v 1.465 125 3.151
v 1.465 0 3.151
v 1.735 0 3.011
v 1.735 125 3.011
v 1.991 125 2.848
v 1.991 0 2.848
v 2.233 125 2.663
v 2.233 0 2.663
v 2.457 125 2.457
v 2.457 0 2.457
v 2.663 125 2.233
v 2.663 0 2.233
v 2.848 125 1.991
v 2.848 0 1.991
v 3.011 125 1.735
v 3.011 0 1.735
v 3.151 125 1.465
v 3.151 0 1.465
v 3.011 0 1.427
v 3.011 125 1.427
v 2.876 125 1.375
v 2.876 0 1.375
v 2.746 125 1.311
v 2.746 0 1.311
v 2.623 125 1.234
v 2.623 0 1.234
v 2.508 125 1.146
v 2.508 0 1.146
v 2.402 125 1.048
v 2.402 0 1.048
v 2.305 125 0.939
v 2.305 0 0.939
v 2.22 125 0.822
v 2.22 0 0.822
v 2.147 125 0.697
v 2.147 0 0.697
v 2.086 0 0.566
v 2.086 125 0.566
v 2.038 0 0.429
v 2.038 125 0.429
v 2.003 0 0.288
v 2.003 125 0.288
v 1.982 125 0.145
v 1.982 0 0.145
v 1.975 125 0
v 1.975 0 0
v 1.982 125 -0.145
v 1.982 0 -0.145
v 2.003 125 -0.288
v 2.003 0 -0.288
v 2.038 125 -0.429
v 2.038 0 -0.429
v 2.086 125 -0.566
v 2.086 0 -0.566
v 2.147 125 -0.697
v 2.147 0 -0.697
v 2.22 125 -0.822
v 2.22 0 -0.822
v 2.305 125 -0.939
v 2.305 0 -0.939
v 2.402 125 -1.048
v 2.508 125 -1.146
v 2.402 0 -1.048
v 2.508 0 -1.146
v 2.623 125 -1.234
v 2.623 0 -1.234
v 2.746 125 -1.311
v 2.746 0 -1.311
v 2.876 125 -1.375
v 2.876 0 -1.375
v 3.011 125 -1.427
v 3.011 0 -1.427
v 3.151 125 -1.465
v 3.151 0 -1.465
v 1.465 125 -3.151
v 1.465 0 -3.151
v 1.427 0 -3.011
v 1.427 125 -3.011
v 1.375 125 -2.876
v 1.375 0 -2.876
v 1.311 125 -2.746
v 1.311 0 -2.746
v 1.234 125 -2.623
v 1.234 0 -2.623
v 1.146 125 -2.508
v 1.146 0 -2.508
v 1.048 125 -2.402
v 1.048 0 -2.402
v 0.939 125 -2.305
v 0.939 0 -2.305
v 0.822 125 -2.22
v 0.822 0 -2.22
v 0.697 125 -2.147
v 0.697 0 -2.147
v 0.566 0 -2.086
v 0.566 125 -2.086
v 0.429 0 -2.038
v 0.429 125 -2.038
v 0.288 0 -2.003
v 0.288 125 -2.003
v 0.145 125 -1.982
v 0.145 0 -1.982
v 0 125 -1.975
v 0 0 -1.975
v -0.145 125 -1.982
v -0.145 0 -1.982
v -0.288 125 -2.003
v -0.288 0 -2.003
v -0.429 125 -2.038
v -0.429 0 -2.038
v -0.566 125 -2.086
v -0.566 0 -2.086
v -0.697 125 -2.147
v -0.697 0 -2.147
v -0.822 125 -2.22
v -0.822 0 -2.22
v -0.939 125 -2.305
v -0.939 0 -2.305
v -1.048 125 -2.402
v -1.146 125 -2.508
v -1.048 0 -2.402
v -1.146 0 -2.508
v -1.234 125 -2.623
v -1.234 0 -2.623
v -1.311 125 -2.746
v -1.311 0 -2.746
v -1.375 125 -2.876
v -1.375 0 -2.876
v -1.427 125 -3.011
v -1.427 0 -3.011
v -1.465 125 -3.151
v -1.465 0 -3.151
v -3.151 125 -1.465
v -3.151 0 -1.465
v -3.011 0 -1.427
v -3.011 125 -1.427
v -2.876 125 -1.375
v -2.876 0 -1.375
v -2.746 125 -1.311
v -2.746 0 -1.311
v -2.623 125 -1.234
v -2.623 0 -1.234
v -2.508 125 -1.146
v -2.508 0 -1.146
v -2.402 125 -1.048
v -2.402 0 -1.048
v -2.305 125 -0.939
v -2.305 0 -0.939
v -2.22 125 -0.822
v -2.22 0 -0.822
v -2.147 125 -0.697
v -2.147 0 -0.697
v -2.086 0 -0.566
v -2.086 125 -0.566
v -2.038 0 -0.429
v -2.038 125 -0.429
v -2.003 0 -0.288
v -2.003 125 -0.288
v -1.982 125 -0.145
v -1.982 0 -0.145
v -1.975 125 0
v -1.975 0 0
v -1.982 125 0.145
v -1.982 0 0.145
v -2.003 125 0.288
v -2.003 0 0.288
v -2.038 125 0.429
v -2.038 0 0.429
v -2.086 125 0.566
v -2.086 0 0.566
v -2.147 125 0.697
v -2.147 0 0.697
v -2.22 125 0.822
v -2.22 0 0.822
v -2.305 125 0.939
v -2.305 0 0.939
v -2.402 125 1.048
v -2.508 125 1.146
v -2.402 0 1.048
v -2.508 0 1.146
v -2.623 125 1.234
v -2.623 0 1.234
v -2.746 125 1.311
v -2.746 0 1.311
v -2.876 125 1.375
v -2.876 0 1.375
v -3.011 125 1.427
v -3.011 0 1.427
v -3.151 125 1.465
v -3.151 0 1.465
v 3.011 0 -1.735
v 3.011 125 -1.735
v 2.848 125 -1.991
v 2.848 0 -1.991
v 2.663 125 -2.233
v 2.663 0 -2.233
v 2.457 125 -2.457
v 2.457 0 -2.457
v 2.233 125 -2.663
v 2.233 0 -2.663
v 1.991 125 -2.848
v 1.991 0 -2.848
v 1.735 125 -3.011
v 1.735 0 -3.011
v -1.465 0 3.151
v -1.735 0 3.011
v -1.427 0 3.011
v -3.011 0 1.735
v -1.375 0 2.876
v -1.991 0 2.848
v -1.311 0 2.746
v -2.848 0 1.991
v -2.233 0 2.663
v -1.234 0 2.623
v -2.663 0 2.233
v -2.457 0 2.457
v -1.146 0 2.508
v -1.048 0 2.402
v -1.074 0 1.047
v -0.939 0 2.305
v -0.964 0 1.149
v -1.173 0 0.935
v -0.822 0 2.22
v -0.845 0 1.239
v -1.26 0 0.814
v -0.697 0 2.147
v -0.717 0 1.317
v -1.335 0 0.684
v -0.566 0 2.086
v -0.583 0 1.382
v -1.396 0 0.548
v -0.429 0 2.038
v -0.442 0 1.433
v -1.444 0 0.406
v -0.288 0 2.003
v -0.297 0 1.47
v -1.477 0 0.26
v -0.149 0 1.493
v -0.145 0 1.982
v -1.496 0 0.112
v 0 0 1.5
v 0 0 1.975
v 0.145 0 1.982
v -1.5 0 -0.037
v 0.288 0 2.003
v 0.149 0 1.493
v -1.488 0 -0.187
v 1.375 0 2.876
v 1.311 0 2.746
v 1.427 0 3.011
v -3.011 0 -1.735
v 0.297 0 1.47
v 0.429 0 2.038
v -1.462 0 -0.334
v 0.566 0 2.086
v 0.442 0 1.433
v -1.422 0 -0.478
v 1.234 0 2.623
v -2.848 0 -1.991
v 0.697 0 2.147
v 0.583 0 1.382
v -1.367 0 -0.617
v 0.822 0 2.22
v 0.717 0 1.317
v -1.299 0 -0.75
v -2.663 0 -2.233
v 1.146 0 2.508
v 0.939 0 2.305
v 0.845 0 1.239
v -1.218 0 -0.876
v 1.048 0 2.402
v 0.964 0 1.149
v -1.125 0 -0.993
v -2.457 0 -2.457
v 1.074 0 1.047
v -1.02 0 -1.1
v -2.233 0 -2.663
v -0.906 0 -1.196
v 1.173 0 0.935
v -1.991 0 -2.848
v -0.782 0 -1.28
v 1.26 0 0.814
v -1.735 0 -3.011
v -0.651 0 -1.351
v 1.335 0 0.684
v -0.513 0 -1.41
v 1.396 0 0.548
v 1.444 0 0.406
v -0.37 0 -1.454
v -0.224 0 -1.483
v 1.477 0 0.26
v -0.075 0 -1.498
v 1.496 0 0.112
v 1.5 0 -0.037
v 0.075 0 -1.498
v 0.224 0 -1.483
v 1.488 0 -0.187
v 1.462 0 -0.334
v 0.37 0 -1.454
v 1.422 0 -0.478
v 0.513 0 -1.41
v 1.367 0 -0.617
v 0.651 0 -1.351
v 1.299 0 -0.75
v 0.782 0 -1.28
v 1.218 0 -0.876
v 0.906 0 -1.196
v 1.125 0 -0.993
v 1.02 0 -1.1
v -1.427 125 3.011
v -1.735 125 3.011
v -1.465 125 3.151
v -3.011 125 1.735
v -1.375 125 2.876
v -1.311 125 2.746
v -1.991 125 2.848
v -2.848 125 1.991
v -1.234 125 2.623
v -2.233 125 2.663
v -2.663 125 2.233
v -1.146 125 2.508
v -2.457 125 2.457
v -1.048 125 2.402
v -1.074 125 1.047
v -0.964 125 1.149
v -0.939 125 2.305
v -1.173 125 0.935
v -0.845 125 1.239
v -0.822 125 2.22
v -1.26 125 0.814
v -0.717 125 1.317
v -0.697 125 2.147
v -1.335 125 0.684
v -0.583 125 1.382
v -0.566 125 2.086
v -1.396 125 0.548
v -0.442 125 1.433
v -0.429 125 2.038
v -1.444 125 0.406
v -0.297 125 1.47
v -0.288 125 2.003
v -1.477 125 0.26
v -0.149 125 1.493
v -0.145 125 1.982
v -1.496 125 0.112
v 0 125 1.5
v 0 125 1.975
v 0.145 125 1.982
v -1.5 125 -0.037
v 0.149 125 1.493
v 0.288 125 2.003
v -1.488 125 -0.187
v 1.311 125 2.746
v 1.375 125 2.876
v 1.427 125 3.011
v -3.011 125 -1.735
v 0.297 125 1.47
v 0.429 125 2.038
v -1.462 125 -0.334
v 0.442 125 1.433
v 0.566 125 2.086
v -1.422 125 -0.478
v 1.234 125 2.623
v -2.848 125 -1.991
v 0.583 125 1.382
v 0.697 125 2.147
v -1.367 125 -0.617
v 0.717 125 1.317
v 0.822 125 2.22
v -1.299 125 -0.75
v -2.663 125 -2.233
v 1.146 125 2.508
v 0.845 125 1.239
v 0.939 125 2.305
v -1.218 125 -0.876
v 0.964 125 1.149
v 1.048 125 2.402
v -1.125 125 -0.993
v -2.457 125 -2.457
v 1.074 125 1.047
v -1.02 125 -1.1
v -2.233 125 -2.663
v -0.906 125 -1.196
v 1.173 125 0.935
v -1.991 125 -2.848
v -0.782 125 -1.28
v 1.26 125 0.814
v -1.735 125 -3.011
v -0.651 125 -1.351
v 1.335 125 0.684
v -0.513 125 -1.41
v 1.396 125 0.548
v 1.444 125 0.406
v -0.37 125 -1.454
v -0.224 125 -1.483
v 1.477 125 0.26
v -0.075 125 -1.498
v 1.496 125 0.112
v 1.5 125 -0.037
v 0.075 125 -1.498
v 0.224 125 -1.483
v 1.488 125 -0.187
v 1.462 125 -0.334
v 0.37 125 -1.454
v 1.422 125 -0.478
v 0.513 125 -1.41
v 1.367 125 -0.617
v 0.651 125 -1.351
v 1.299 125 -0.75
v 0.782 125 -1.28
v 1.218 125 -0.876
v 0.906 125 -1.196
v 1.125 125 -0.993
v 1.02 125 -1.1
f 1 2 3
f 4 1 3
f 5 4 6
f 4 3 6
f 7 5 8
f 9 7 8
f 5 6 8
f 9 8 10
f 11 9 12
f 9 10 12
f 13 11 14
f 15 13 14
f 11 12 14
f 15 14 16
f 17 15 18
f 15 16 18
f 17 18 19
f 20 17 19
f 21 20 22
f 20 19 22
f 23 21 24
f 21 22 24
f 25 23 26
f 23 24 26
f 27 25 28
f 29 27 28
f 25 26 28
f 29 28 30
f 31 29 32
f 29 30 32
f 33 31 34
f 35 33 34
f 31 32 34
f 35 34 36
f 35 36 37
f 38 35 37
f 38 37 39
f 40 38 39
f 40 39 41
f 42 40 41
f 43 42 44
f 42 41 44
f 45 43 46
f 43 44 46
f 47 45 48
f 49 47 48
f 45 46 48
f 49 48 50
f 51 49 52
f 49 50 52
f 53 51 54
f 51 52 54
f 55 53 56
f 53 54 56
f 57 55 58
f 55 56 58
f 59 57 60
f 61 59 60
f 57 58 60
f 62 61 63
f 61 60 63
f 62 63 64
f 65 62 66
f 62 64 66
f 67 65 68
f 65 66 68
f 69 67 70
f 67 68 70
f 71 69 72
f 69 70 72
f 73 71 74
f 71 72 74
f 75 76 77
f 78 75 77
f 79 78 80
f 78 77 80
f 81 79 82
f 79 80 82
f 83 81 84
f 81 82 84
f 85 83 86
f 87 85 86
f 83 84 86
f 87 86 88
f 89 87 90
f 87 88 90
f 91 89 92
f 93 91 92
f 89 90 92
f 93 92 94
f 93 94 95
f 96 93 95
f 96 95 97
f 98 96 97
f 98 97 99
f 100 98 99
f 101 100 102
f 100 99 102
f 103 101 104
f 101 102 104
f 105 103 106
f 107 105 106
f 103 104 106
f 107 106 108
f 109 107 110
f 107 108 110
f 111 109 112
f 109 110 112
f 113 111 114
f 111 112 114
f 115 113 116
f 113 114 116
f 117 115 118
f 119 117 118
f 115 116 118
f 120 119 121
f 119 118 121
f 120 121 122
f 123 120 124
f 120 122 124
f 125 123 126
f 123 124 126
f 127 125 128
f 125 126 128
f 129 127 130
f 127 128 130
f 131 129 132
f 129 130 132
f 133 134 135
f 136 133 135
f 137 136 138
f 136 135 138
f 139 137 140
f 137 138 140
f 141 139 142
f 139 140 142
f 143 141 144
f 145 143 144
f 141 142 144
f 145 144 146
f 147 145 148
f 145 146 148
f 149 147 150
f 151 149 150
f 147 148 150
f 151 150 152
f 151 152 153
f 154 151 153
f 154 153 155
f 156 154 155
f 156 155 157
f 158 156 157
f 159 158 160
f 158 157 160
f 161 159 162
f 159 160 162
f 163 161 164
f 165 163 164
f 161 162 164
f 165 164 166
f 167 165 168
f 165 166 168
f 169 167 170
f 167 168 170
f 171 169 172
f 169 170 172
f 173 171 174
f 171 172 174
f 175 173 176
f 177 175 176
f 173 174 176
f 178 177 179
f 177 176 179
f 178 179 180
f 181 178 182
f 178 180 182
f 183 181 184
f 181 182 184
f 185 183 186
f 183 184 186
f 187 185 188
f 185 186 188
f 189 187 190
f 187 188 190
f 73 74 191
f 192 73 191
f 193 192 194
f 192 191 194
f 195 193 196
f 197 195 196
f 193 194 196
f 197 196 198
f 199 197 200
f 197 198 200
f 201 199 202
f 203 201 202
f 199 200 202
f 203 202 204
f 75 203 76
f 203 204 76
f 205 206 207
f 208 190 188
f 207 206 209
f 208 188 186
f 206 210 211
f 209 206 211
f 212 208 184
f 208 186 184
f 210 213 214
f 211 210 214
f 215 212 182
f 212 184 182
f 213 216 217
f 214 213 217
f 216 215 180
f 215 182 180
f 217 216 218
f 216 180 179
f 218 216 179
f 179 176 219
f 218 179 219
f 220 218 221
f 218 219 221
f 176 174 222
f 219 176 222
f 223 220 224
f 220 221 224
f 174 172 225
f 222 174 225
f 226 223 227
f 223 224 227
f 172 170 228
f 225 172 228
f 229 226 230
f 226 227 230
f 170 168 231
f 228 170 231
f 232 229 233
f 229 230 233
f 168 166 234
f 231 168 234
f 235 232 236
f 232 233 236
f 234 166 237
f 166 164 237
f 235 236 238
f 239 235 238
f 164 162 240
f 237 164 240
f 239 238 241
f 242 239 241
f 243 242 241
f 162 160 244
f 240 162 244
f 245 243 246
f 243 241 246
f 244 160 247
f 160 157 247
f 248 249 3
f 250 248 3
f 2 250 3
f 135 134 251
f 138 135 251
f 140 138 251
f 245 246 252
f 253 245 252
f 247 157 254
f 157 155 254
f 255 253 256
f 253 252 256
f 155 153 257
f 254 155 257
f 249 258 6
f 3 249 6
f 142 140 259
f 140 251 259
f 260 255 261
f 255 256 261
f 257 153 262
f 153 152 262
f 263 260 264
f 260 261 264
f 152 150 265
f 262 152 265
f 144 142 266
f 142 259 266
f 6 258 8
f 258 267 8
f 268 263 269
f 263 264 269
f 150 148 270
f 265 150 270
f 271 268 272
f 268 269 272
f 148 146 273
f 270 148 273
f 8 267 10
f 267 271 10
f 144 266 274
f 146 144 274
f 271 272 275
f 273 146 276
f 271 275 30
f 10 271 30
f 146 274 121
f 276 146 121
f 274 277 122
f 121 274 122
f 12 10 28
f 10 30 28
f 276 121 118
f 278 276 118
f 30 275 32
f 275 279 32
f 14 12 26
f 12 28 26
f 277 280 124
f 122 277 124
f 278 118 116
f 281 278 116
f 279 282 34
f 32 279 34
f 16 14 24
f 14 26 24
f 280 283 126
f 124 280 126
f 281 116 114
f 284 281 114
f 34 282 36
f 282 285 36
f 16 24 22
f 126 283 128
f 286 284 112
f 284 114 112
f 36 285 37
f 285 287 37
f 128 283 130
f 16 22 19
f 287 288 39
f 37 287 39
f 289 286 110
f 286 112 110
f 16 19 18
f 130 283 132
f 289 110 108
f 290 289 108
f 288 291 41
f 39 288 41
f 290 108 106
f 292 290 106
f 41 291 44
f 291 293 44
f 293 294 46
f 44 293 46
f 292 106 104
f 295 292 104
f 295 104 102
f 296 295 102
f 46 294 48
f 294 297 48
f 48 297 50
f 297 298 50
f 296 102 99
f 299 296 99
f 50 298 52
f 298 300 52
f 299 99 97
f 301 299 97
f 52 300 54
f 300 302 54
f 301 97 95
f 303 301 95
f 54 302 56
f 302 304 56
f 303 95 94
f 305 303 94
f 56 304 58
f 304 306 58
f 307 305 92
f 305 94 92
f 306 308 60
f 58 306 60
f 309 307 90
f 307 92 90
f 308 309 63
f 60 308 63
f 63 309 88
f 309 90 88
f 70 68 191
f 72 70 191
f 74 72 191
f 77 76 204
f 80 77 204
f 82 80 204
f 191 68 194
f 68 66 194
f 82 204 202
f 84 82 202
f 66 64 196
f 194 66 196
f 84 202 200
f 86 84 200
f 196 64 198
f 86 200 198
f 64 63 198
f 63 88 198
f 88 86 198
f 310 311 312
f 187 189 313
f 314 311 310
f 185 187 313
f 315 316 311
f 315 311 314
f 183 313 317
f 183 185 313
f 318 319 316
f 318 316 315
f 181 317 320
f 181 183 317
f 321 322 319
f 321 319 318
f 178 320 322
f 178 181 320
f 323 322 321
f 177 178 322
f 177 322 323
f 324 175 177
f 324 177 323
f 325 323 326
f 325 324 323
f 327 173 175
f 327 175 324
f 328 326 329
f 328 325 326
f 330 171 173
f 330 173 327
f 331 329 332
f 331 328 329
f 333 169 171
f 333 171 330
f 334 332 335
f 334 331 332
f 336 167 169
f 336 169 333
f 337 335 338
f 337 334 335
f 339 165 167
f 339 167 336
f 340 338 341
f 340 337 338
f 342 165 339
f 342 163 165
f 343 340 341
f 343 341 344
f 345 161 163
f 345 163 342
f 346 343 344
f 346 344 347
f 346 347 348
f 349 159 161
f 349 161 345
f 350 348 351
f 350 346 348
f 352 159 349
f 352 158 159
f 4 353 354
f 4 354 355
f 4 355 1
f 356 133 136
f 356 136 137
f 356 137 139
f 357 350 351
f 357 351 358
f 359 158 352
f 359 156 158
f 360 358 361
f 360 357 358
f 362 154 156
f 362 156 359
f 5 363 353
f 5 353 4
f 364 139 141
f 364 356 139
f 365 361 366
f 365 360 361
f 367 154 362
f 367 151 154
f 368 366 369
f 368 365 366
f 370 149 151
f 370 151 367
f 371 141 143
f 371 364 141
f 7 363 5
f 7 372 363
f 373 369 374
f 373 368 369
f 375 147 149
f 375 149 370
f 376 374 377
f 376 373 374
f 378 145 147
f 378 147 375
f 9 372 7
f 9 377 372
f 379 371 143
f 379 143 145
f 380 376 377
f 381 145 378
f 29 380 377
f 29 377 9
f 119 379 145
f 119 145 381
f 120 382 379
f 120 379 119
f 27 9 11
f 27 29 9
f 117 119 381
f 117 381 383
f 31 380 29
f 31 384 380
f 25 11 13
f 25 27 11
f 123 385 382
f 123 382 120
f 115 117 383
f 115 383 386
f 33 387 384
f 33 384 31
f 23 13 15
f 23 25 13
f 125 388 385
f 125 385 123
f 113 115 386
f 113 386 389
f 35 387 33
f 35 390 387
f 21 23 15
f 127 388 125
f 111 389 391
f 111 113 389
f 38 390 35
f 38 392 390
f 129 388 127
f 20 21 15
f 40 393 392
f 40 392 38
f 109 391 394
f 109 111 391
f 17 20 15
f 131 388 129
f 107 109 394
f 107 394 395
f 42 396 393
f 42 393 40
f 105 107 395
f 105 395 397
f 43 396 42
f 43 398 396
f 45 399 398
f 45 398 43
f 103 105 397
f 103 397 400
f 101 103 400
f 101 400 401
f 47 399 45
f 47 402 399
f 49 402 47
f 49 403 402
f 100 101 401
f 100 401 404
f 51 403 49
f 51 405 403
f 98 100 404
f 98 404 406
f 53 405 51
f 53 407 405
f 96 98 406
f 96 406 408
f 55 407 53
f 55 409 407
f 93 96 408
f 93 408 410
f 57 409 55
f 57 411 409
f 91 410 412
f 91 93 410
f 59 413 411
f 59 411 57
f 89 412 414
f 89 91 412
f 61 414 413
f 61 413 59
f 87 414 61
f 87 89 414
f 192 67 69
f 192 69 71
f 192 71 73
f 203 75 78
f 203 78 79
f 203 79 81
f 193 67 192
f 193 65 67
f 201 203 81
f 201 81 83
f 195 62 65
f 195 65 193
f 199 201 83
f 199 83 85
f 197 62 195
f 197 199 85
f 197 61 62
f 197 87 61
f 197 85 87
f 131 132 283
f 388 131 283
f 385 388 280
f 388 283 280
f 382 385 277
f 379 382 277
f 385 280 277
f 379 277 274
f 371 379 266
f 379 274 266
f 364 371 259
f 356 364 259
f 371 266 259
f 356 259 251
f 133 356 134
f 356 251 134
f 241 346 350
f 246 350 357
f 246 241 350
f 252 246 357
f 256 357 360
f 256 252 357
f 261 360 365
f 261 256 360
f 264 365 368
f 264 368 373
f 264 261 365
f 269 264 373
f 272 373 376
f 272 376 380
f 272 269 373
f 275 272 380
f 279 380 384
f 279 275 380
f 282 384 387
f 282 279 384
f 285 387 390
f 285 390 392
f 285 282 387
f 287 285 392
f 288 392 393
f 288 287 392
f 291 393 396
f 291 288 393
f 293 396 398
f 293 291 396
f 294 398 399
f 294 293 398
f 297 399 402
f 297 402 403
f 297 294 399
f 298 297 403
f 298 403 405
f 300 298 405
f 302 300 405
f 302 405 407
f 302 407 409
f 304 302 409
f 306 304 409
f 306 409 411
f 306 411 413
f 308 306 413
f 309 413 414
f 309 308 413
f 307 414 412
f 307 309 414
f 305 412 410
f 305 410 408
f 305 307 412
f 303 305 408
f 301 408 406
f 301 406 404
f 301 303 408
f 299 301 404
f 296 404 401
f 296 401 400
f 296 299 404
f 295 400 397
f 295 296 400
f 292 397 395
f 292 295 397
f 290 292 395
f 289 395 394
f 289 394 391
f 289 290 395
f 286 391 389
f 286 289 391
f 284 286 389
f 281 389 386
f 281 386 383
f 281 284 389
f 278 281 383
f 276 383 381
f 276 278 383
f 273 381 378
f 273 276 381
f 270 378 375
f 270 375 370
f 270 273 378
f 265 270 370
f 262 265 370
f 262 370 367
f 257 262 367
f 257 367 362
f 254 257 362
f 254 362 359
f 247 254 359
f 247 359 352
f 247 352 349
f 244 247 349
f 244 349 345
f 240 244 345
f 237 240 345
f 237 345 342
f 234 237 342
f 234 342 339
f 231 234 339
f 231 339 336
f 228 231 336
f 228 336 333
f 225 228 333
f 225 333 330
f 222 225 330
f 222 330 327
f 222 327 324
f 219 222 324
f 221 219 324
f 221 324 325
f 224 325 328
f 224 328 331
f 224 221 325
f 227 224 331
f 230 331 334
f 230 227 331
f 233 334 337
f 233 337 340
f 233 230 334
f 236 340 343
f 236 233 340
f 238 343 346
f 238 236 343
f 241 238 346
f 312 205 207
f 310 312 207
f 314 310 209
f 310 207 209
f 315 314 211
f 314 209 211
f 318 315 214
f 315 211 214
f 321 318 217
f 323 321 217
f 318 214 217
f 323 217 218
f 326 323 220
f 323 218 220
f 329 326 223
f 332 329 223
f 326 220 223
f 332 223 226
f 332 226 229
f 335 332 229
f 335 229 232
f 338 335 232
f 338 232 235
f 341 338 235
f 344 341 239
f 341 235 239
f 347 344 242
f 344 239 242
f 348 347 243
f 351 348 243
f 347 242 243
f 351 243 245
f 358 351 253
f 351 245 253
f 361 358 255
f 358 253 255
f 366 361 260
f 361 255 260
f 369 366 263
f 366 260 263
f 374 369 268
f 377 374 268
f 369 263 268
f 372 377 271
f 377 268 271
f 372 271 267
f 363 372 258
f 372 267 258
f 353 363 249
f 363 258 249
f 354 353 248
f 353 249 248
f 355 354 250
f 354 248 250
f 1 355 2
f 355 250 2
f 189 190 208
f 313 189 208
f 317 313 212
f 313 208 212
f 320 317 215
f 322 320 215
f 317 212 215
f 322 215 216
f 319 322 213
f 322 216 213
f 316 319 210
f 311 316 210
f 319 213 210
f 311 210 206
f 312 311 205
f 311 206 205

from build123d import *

# Parameters (mm, degrees)
SKETCH1_R           = 1.5
BOSS_EXTRUDE1_DEPTH = 125


with BuildPart() as part:
    # Sketch1 → Boss-Extrude1 (new body)
    with BuildSketch(Plane(origin=(0, 0, 0), x_dir=(1, 0, 0), z_dir=(0, 1, 0))):
        with BuildLine():
            ThreePointArc((-3.151258993, -1.464647316), (-2.457196065, -2.457196065), (-1.464647316, -3.151258993))
            ThreePointArc((-1.464647316, -3.151258993), (0, -1.975), (1.464647316, -3.151258993))
            ThreePointArc((1.464647316, -3.151258993), (2.457196065, -2.457196065), (3.151258993, -1.464647316))
            ThreePointArc((3.151258993, -1.464647316), (1.975, 0), (3.151258993, 1.464647316))
            ThreePointArc((3.151258993, 1.464647316), (2.457196065, 2.457196065), (1.464647316, 3.151258993))
            ThreePointArc((1.464647316, 3.151258993), (0, 1.975), (-1.464647316, 3.151258993))
            ThreePointArc((-1.464647316, 3.151258993), (-2.457196065, 2.457196065), (-3.151258993, 1.464647316))
            ThreePointArc((-3.151258993, 1.464647316), (-1.975, 0), (-3.151258993, -1.464647316))
        make_face()
        with Locations(Location((0, 0, 0), (0, 0, 270))):
            Circle(SKETCH1_R, mode=Mode.SUBTRACT)
    extrude(amount=BOSS_EXTRUDE1_DEPTH)


solid = part.part
